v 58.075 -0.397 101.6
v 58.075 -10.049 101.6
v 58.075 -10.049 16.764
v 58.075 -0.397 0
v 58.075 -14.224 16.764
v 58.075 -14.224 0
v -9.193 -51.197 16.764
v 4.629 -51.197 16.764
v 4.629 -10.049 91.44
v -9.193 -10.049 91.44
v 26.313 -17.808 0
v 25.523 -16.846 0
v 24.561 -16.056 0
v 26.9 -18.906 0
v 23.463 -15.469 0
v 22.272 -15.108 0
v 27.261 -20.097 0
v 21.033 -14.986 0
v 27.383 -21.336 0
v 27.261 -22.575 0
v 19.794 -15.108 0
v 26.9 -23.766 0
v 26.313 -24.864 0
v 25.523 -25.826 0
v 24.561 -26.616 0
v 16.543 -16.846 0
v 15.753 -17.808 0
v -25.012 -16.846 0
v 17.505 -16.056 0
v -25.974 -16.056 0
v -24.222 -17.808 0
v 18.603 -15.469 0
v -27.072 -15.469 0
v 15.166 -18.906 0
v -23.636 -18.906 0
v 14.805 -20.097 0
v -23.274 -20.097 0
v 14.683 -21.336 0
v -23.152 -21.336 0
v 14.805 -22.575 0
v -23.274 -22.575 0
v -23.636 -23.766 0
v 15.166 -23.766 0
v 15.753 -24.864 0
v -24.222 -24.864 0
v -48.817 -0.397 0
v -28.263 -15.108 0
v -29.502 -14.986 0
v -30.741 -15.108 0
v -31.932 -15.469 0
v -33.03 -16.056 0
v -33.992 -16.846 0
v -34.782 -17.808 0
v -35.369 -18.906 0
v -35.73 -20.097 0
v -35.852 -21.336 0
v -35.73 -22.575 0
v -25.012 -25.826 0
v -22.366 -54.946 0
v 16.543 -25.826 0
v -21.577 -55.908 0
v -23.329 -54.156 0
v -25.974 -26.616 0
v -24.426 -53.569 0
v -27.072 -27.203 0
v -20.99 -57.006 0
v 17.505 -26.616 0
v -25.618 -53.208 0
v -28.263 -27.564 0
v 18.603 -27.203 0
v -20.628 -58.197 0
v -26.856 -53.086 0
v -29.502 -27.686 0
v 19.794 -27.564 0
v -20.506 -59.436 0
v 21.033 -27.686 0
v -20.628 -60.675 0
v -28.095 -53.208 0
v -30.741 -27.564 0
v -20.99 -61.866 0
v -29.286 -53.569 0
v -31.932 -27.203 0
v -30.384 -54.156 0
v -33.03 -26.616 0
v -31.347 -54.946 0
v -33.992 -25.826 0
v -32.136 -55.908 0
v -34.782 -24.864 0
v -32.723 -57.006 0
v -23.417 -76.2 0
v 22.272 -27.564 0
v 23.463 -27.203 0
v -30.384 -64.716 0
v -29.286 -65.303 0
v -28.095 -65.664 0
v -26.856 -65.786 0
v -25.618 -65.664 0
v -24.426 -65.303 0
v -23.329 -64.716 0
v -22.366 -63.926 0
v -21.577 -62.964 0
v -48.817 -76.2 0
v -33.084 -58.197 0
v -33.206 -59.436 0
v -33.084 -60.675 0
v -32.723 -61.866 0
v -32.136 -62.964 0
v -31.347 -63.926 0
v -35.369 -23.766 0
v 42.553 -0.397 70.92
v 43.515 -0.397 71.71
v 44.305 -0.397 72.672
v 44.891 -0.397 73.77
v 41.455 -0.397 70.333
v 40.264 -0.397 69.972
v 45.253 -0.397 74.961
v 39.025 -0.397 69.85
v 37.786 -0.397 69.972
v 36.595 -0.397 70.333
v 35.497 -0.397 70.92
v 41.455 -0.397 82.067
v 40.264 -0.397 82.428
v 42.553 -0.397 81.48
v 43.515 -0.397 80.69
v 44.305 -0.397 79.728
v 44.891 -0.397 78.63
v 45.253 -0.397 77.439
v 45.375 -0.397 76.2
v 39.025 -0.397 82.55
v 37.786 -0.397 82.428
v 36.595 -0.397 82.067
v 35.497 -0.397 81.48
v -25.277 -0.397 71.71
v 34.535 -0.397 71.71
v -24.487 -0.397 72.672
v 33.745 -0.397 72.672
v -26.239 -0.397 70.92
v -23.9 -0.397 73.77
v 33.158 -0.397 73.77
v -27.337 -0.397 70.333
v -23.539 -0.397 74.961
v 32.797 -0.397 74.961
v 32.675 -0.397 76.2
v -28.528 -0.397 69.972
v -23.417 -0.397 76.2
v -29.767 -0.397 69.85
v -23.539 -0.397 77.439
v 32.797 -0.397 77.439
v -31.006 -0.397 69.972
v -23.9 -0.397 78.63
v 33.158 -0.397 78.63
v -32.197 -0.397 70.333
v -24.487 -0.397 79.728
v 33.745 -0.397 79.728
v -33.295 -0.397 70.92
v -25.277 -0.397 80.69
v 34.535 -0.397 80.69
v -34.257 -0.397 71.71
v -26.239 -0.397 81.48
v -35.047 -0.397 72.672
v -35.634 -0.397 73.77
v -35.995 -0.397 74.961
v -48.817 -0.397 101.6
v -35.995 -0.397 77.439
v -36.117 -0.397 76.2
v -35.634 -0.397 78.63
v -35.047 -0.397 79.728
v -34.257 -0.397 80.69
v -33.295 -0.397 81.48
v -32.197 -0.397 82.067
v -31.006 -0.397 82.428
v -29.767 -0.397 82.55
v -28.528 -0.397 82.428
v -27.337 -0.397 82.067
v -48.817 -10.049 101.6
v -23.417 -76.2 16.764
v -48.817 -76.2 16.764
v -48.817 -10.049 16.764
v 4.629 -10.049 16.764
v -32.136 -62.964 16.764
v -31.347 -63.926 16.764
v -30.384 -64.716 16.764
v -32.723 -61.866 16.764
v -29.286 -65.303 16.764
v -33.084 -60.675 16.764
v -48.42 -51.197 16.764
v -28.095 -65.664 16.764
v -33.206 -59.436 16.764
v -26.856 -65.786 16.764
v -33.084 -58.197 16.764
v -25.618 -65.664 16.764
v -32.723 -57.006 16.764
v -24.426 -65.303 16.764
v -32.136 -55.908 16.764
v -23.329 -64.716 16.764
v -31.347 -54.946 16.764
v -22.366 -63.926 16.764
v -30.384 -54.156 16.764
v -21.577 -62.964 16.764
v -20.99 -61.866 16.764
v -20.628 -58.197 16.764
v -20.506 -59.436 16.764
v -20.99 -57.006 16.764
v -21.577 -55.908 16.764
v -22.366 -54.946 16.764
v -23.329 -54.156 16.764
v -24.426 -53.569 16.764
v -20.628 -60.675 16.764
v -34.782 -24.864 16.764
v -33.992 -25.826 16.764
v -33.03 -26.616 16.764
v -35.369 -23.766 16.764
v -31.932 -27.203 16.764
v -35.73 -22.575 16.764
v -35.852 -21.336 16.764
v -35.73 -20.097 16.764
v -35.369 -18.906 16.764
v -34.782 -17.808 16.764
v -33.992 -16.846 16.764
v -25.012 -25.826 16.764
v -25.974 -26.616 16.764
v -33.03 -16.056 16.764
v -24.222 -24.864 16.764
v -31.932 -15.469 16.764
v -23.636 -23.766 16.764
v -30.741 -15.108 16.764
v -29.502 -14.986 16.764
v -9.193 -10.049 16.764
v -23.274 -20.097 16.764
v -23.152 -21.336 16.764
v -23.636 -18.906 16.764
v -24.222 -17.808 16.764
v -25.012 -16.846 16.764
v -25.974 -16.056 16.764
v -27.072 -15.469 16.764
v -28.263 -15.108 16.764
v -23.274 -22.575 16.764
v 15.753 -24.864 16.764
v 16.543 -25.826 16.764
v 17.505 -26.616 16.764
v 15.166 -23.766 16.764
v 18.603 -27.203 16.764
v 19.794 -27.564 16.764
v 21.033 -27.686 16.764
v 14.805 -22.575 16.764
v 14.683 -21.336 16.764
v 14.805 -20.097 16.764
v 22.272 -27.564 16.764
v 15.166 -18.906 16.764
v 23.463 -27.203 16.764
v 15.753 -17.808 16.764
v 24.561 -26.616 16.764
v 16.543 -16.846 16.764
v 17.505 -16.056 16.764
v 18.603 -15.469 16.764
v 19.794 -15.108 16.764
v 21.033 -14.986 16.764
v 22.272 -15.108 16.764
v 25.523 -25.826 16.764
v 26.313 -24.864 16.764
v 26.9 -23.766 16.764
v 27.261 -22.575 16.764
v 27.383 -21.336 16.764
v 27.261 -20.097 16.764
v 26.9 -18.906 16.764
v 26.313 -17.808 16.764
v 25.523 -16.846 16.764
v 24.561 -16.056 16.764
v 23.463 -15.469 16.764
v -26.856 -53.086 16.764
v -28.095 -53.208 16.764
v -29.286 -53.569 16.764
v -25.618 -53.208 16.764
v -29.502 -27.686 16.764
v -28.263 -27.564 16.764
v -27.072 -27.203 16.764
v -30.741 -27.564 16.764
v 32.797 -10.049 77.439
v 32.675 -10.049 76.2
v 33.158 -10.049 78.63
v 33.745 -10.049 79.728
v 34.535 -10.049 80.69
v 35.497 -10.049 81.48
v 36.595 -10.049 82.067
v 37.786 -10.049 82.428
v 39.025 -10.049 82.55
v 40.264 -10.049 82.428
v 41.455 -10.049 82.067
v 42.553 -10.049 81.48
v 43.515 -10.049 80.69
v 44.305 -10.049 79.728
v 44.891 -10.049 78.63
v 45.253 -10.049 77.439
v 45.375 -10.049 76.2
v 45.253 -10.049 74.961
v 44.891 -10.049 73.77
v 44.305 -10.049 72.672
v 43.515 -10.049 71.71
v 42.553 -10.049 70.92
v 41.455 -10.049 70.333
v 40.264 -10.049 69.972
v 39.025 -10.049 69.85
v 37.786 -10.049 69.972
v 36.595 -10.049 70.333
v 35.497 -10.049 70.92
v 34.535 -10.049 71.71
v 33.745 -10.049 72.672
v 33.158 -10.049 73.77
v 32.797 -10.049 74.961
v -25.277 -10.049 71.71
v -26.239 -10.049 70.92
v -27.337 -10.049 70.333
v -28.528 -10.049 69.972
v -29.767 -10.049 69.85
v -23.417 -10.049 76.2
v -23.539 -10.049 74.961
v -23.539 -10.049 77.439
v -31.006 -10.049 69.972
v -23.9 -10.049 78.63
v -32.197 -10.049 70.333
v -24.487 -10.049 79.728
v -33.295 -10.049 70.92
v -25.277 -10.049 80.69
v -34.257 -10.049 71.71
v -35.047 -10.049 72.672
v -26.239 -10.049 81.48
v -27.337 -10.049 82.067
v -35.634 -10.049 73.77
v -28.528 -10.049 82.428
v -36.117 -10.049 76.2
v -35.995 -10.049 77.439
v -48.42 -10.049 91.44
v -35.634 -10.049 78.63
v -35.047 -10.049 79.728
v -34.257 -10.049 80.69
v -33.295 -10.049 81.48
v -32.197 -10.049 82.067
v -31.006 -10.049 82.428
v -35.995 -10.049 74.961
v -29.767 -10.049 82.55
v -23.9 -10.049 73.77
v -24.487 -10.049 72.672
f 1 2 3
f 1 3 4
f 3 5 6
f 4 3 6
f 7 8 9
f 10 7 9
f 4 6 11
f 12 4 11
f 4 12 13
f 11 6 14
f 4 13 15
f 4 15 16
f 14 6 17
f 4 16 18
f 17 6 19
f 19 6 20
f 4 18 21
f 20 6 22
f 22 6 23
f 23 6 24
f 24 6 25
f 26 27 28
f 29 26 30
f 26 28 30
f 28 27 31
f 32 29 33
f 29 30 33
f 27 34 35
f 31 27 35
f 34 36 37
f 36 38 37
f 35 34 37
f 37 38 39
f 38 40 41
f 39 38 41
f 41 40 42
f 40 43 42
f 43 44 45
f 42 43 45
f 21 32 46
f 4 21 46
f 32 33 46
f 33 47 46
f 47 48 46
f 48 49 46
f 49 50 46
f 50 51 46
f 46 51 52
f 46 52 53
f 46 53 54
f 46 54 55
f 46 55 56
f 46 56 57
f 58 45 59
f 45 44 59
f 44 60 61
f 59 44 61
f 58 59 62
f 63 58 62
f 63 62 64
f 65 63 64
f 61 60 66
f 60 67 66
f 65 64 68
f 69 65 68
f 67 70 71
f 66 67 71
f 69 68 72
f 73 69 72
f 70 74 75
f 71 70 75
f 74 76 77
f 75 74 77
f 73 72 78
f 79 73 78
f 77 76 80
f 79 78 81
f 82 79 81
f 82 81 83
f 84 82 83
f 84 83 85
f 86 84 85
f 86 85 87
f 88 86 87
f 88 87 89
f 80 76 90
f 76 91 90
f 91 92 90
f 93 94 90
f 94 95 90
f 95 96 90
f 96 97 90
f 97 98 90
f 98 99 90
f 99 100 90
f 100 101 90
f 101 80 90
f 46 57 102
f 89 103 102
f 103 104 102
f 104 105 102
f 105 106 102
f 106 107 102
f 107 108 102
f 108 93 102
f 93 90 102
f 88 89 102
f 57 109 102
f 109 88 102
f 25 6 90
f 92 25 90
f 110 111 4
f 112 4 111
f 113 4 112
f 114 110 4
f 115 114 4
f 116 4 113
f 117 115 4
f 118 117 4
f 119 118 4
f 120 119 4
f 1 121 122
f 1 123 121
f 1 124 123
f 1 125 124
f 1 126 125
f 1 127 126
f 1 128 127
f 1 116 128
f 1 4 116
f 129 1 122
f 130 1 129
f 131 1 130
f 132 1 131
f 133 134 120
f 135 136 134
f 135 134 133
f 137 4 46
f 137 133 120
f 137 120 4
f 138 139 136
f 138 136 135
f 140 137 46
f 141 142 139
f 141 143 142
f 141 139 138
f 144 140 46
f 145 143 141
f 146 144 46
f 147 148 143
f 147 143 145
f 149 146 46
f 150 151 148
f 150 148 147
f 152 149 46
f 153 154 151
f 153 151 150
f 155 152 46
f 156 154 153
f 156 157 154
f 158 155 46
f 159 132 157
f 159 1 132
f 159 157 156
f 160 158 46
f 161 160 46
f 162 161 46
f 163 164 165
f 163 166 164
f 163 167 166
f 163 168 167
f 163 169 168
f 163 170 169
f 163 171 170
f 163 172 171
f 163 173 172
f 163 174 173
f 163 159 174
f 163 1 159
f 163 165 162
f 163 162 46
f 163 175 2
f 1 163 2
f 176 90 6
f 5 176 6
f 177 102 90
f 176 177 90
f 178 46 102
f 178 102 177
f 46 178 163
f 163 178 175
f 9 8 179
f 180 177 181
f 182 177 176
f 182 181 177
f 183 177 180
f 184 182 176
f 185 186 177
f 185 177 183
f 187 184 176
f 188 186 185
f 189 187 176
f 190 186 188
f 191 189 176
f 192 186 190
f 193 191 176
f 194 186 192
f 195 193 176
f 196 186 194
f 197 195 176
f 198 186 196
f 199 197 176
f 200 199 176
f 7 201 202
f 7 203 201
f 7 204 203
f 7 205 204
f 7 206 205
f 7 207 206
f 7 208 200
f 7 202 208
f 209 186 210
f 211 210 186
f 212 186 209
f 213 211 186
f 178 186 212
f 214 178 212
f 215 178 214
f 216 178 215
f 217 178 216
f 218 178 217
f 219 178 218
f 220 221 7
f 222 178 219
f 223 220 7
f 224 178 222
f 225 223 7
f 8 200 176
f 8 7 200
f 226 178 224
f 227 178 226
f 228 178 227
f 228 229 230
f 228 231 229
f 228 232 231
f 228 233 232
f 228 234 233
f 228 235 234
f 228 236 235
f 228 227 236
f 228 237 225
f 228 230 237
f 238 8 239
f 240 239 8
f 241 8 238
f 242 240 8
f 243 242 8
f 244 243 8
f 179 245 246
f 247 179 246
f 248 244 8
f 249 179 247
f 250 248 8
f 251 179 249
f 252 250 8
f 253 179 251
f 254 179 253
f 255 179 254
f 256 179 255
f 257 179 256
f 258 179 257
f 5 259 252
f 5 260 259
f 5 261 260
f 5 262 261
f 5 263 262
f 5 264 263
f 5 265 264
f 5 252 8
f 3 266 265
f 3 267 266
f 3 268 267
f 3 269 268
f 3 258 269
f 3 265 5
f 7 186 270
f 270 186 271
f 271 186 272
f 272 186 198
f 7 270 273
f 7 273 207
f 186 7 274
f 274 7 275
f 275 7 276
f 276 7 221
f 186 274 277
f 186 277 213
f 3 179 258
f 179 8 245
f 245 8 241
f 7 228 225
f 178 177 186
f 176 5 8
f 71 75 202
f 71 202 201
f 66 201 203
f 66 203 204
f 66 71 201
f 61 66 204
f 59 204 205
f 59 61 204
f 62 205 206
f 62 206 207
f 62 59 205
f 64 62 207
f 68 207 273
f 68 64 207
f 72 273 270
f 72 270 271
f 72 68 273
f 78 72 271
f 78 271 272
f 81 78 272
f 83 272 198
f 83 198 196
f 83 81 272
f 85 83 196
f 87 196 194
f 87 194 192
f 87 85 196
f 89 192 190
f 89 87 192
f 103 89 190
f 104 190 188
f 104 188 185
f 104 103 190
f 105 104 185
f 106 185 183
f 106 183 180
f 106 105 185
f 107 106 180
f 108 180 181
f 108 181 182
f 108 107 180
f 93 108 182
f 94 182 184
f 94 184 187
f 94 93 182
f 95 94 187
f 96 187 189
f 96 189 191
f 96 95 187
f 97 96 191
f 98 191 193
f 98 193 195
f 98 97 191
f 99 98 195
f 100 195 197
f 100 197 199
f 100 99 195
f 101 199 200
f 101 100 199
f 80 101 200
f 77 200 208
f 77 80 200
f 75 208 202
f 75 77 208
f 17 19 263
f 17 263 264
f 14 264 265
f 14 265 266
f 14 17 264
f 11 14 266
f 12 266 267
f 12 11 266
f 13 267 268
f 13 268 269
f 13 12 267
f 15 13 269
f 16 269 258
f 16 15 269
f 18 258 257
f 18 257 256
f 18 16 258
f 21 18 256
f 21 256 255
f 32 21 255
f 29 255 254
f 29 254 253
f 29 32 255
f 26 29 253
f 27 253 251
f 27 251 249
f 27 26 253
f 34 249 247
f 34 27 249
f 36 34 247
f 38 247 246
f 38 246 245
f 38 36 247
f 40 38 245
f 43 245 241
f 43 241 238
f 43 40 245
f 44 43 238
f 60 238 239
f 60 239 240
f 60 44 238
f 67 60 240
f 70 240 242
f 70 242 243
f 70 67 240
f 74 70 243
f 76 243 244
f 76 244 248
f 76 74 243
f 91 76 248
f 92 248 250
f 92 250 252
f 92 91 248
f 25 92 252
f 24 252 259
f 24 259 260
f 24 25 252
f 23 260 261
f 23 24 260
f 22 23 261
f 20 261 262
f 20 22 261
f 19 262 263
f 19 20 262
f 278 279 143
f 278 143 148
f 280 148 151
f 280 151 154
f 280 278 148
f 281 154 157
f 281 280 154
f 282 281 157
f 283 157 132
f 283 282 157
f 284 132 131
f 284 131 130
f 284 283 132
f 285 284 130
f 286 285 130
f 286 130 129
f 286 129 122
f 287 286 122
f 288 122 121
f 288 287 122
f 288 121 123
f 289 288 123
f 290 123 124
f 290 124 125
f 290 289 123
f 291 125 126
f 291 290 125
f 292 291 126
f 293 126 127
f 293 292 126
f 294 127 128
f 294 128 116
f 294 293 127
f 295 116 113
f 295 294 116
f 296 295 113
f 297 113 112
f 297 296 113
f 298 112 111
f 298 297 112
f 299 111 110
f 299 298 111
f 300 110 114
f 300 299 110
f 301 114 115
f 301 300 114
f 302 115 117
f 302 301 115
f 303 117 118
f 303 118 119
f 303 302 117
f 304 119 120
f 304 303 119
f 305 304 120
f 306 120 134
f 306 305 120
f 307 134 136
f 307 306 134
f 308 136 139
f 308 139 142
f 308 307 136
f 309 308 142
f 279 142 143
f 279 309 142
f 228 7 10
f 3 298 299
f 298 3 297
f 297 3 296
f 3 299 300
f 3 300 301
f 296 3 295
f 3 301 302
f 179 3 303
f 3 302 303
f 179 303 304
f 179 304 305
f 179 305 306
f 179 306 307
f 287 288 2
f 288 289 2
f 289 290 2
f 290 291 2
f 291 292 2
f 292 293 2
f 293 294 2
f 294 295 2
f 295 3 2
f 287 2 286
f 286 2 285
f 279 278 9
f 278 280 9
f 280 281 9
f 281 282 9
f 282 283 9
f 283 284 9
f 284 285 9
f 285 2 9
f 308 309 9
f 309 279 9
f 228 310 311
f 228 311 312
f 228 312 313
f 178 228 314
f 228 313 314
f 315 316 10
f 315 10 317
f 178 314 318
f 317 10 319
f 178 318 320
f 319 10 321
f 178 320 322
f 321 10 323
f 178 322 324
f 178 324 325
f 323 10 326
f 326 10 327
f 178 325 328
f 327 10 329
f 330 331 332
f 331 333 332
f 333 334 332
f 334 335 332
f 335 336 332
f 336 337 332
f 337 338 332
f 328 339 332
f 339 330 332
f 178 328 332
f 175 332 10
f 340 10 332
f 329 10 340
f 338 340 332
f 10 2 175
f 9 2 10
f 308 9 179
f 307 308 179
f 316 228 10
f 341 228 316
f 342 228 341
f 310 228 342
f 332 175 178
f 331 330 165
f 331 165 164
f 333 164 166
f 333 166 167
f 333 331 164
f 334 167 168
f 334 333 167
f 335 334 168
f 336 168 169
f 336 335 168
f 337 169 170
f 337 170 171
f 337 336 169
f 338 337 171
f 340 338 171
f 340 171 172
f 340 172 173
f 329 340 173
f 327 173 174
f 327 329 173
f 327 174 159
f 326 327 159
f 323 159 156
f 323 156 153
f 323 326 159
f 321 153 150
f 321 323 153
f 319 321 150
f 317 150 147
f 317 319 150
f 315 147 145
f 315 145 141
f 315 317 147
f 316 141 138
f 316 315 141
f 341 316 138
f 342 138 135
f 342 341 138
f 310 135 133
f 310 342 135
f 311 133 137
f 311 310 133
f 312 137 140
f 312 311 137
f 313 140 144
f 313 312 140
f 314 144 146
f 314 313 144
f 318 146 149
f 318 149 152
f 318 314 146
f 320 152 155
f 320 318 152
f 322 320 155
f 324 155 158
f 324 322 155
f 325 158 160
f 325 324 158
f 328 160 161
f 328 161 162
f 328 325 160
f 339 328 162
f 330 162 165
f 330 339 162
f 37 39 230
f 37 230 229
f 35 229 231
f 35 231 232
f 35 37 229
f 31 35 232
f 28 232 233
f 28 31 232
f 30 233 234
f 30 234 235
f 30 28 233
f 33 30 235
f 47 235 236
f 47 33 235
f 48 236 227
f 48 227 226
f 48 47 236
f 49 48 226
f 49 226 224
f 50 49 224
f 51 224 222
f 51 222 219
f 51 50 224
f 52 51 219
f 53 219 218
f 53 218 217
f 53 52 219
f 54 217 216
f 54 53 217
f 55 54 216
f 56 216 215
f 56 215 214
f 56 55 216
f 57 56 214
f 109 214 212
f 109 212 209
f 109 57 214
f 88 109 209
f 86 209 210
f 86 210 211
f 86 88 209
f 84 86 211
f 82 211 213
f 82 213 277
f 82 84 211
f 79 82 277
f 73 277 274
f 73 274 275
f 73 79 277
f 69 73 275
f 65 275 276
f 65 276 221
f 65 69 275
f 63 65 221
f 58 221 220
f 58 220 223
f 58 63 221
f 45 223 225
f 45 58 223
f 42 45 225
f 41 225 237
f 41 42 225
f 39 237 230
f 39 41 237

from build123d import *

# Parameters (mm, degrees)
F0_R     = 6.35
F1_DEPTH = 16.764
F2_R     = 6.35
F2_W     = 27.6436659317
F2_H     = 72.136
F3_DEPTH = 9.652
F4_W     = 13.8218329659
F4_H     = 41.148
F5_DEPTH = 74.676
F7_DEPTH = 53.04913


with BuildPart() as f1:
    # F0 (on Top) → F1 (new body)
    with BuildSketch(Plane.XY):
        Polygon((58.0747899478, -10.0489559141), (-48.8168759839, -10.0489559141), (-48.8168759839, -76.2), (-23.4168759839, -76.2), (58.0747899478, -14.224), align=None)
        with Locations((-26.856459501, -59.436)):
            Circle(F0_R, mode=Mode.SUBTRACT)
        with Locations((-29.5022924669, -21.336)):
            Circle(F0_R, mode=Mode.SUBTRACT)
        with Locations((21.0331240161, -21.336)):
            Circle(F0_R, mode=Mode.SUBTRACT)
    extrude(amount=F1_DEPTH)

    # F2 (on face) → F3 (join)
    with BuildSketch(Plane(origin=(0, -10.0489559141, 0), x_dir=(-1, 0, 0), z_dir=(0, 1, 0))):
        Polygon((-58.0747899478, 16.764), (-58.0747899478, 0), (48.8168759839, 0), (48.8168759839, 16.764), (9.1928759839, 16.764), (-18.4507899478, 16.764), align=None)
        Polygon((-58.0747899478, 101.6), (-58.0747899478, 16.764), (-18.4507899478, 16.764), (-18.4507899478, 88.9), (9.1928759839, 88.9), (9.1928759839, 16.764), (48.8168759839, 16.764), (48.8168759839, 101.6), align=None)
        with Locations((-39.0247899478, 76.2)):
            Circle(F2_R, mode=Mode.SUBTRACT)
        with Locations((29.7668759839, 76.2)):
            Circle(F2_R, mode=Mode.SUBTRACT)
        with Locations((-4.6289569819, 52.832)):
            Rectangle(F2_W, F2_H)
    extrude(amount=F3_DEPTH)

    # F4 (on face) → F5 (join)
    with BuildSketch(Plane.XY.offset(16.764)):
        with Locations((-2.281959501, -30.6229559141)):
            Rectangle(F4_W, F4_H)
    extrude(amount=F5_DEPTH)

    # F6 (on face) → F7 (cut)
    with BuildSketch(Plane.YZ.offset(4.6289569819)):
        Polygon((-51.1969559141, 91.44), (-51.1969559141, 16.764), (-10.0489559141, 91.44), align=None)
    extrude(amount=-F7_DEPTH, mode=Mode.SUBTRACT)


solid = f1.part
